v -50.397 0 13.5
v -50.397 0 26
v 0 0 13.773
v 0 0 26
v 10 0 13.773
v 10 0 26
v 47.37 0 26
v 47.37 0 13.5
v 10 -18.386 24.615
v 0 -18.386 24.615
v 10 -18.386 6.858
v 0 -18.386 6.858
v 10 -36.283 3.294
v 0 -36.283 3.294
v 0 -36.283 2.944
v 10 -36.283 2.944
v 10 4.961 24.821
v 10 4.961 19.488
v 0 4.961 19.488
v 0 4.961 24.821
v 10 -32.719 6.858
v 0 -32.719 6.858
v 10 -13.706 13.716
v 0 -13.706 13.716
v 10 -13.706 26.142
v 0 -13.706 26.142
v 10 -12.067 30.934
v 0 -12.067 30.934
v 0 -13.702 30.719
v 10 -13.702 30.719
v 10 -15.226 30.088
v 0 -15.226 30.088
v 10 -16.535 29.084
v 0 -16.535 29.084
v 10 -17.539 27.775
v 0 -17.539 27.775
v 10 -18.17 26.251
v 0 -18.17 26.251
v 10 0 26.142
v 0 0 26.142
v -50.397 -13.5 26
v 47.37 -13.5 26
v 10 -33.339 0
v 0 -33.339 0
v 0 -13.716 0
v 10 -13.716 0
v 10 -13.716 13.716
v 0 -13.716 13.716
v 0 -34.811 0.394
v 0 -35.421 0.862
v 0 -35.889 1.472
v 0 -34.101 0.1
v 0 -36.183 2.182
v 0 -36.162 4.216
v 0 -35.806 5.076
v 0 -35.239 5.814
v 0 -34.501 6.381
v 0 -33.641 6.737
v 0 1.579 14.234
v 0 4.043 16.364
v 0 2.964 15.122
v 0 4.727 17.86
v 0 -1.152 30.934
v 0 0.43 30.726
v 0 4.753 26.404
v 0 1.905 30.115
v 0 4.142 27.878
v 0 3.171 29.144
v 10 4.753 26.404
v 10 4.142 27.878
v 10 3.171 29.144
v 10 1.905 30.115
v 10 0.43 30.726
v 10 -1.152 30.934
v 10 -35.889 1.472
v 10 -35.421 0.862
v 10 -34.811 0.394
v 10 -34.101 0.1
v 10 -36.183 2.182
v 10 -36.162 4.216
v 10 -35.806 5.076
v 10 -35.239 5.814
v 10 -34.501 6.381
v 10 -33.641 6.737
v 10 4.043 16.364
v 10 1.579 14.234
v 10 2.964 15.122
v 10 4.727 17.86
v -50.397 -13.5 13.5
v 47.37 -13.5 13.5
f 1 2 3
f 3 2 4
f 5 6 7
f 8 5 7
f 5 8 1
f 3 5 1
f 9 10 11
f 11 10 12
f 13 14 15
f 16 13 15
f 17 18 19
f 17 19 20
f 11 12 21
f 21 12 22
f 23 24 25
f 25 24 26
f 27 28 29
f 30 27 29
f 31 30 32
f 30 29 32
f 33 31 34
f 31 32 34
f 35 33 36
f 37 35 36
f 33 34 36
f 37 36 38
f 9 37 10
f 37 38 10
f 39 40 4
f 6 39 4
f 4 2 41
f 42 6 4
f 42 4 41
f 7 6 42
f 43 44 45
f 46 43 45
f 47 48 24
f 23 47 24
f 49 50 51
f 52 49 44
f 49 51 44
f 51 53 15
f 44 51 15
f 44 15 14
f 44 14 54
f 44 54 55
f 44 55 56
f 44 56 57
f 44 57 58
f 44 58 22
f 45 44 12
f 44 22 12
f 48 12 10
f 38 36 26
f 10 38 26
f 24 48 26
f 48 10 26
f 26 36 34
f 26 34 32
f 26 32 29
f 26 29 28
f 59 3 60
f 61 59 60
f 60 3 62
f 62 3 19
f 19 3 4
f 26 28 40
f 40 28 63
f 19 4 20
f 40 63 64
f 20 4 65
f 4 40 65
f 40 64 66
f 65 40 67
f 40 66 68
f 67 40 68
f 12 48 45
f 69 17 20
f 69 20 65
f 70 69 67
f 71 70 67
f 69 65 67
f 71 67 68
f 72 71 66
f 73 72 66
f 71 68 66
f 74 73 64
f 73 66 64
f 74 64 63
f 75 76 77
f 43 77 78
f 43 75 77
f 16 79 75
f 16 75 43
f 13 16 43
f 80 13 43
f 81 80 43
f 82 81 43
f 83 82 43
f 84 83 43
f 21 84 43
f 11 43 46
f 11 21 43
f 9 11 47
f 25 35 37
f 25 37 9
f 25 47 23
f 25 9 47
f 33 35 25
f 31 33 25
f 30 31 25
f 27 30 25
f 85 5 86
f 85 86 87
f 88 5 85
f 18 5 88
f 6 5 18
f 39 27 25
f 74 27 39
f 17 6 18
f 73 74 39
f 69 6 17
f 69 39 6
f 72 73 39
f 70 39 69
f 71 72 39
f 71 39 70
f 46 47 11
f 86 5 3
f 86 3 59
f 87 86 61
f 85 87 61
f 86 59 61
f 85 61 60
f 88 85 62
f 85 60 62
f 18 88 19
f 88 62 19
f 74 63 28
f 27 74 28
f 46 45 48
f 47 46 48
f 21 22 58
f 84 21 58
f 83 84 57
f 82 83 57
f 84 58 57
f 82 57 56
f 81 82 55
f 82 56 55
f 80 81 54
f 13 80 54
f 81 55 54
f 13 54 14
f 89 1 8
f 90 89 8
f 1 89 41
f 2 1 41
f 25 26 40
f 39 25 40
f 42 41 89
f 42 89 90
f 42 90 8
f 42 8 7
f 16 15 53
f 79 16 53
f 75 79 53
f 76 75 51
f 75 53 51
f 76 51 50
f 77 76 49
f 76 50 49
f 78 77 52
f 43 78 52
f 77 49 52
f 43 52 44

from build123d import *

# Parameters (mm, degrees)
F0_W     = 97.767125
F0_H     = 12.5
F1_DEPTH = 13.5
F3_DEPTH = 10


with BuildPart() as f1:
    # F0 (on Front) → F1 (new body)
    with BuildSketch(Plane.XZ):
        with Locations((-1.513699, 19.75)):
            Rectangle(F0_W, F0_H)
    extrude(amount=F1_DEPTH)

    # F2 (on Right) → F3 (join)
    with BuildSketch(Plane.YZ):
        with BuildLine():
            ThreePointArc((4.961186, 24.821395), (3.170716, 29.143972), (-1.151862, 30.934442))
            Line((-1.151862, 30.934442), (-12.06661, 30.934442))
            ThreePointArc((-12.06661, 30.934442), (-16.534783, 29.083664), (-18.385561, 24.615491))
            Line((-18.385561, 24.615491), (-18.385561, 13.716214))
            Line((-18.385561, 13.716214), (-13.716212, 13.716214))
            Line((-13.716212, 13.716214), (-13.706157, 13.716214))
            Line((-13.706157, 13.716214), (-13.706157, 26.142228))
            Line((-13.706157, 26.142228), (0, 26.142228))
            Line((0, 26.142228), (0, 13.773428))
            ThreePointArc((0, 13.773428), (3.54785, 15.704206), (4.961186, 19.488069))
            Line((4.961186, 19.488069), (4.961186, 24.821395))
        make_face()
        Polygon((-13.716212, 13.716214), (-18.385561, 13.716214), (-18.385561, 6.858107), (-18.385561, 0), (-13.716212, 0), align=None)
        with BuildLine():
            Line((-18.385561, 0), (-18.385561, 6.858107))
            Line((-18.385561, 6.858107), (-32.718604, 6.858107))
            ThreePointArc((-32.718604, 6.858107), (-35.239143, 5.814066), (-36.283184, 3.293528))
            Line((-36.283184, 3.293528), (-36.283184, 2.944212))
            ThreePointArc((-36.283184, 2.944212), (-35.420844, 0.86234), (-33.338972, 0))
            Line((-33.338972, 0), (-18.385561, 0))
        make_face()
    extrude(amount=F3_DEPTH)


solid = f1.part
